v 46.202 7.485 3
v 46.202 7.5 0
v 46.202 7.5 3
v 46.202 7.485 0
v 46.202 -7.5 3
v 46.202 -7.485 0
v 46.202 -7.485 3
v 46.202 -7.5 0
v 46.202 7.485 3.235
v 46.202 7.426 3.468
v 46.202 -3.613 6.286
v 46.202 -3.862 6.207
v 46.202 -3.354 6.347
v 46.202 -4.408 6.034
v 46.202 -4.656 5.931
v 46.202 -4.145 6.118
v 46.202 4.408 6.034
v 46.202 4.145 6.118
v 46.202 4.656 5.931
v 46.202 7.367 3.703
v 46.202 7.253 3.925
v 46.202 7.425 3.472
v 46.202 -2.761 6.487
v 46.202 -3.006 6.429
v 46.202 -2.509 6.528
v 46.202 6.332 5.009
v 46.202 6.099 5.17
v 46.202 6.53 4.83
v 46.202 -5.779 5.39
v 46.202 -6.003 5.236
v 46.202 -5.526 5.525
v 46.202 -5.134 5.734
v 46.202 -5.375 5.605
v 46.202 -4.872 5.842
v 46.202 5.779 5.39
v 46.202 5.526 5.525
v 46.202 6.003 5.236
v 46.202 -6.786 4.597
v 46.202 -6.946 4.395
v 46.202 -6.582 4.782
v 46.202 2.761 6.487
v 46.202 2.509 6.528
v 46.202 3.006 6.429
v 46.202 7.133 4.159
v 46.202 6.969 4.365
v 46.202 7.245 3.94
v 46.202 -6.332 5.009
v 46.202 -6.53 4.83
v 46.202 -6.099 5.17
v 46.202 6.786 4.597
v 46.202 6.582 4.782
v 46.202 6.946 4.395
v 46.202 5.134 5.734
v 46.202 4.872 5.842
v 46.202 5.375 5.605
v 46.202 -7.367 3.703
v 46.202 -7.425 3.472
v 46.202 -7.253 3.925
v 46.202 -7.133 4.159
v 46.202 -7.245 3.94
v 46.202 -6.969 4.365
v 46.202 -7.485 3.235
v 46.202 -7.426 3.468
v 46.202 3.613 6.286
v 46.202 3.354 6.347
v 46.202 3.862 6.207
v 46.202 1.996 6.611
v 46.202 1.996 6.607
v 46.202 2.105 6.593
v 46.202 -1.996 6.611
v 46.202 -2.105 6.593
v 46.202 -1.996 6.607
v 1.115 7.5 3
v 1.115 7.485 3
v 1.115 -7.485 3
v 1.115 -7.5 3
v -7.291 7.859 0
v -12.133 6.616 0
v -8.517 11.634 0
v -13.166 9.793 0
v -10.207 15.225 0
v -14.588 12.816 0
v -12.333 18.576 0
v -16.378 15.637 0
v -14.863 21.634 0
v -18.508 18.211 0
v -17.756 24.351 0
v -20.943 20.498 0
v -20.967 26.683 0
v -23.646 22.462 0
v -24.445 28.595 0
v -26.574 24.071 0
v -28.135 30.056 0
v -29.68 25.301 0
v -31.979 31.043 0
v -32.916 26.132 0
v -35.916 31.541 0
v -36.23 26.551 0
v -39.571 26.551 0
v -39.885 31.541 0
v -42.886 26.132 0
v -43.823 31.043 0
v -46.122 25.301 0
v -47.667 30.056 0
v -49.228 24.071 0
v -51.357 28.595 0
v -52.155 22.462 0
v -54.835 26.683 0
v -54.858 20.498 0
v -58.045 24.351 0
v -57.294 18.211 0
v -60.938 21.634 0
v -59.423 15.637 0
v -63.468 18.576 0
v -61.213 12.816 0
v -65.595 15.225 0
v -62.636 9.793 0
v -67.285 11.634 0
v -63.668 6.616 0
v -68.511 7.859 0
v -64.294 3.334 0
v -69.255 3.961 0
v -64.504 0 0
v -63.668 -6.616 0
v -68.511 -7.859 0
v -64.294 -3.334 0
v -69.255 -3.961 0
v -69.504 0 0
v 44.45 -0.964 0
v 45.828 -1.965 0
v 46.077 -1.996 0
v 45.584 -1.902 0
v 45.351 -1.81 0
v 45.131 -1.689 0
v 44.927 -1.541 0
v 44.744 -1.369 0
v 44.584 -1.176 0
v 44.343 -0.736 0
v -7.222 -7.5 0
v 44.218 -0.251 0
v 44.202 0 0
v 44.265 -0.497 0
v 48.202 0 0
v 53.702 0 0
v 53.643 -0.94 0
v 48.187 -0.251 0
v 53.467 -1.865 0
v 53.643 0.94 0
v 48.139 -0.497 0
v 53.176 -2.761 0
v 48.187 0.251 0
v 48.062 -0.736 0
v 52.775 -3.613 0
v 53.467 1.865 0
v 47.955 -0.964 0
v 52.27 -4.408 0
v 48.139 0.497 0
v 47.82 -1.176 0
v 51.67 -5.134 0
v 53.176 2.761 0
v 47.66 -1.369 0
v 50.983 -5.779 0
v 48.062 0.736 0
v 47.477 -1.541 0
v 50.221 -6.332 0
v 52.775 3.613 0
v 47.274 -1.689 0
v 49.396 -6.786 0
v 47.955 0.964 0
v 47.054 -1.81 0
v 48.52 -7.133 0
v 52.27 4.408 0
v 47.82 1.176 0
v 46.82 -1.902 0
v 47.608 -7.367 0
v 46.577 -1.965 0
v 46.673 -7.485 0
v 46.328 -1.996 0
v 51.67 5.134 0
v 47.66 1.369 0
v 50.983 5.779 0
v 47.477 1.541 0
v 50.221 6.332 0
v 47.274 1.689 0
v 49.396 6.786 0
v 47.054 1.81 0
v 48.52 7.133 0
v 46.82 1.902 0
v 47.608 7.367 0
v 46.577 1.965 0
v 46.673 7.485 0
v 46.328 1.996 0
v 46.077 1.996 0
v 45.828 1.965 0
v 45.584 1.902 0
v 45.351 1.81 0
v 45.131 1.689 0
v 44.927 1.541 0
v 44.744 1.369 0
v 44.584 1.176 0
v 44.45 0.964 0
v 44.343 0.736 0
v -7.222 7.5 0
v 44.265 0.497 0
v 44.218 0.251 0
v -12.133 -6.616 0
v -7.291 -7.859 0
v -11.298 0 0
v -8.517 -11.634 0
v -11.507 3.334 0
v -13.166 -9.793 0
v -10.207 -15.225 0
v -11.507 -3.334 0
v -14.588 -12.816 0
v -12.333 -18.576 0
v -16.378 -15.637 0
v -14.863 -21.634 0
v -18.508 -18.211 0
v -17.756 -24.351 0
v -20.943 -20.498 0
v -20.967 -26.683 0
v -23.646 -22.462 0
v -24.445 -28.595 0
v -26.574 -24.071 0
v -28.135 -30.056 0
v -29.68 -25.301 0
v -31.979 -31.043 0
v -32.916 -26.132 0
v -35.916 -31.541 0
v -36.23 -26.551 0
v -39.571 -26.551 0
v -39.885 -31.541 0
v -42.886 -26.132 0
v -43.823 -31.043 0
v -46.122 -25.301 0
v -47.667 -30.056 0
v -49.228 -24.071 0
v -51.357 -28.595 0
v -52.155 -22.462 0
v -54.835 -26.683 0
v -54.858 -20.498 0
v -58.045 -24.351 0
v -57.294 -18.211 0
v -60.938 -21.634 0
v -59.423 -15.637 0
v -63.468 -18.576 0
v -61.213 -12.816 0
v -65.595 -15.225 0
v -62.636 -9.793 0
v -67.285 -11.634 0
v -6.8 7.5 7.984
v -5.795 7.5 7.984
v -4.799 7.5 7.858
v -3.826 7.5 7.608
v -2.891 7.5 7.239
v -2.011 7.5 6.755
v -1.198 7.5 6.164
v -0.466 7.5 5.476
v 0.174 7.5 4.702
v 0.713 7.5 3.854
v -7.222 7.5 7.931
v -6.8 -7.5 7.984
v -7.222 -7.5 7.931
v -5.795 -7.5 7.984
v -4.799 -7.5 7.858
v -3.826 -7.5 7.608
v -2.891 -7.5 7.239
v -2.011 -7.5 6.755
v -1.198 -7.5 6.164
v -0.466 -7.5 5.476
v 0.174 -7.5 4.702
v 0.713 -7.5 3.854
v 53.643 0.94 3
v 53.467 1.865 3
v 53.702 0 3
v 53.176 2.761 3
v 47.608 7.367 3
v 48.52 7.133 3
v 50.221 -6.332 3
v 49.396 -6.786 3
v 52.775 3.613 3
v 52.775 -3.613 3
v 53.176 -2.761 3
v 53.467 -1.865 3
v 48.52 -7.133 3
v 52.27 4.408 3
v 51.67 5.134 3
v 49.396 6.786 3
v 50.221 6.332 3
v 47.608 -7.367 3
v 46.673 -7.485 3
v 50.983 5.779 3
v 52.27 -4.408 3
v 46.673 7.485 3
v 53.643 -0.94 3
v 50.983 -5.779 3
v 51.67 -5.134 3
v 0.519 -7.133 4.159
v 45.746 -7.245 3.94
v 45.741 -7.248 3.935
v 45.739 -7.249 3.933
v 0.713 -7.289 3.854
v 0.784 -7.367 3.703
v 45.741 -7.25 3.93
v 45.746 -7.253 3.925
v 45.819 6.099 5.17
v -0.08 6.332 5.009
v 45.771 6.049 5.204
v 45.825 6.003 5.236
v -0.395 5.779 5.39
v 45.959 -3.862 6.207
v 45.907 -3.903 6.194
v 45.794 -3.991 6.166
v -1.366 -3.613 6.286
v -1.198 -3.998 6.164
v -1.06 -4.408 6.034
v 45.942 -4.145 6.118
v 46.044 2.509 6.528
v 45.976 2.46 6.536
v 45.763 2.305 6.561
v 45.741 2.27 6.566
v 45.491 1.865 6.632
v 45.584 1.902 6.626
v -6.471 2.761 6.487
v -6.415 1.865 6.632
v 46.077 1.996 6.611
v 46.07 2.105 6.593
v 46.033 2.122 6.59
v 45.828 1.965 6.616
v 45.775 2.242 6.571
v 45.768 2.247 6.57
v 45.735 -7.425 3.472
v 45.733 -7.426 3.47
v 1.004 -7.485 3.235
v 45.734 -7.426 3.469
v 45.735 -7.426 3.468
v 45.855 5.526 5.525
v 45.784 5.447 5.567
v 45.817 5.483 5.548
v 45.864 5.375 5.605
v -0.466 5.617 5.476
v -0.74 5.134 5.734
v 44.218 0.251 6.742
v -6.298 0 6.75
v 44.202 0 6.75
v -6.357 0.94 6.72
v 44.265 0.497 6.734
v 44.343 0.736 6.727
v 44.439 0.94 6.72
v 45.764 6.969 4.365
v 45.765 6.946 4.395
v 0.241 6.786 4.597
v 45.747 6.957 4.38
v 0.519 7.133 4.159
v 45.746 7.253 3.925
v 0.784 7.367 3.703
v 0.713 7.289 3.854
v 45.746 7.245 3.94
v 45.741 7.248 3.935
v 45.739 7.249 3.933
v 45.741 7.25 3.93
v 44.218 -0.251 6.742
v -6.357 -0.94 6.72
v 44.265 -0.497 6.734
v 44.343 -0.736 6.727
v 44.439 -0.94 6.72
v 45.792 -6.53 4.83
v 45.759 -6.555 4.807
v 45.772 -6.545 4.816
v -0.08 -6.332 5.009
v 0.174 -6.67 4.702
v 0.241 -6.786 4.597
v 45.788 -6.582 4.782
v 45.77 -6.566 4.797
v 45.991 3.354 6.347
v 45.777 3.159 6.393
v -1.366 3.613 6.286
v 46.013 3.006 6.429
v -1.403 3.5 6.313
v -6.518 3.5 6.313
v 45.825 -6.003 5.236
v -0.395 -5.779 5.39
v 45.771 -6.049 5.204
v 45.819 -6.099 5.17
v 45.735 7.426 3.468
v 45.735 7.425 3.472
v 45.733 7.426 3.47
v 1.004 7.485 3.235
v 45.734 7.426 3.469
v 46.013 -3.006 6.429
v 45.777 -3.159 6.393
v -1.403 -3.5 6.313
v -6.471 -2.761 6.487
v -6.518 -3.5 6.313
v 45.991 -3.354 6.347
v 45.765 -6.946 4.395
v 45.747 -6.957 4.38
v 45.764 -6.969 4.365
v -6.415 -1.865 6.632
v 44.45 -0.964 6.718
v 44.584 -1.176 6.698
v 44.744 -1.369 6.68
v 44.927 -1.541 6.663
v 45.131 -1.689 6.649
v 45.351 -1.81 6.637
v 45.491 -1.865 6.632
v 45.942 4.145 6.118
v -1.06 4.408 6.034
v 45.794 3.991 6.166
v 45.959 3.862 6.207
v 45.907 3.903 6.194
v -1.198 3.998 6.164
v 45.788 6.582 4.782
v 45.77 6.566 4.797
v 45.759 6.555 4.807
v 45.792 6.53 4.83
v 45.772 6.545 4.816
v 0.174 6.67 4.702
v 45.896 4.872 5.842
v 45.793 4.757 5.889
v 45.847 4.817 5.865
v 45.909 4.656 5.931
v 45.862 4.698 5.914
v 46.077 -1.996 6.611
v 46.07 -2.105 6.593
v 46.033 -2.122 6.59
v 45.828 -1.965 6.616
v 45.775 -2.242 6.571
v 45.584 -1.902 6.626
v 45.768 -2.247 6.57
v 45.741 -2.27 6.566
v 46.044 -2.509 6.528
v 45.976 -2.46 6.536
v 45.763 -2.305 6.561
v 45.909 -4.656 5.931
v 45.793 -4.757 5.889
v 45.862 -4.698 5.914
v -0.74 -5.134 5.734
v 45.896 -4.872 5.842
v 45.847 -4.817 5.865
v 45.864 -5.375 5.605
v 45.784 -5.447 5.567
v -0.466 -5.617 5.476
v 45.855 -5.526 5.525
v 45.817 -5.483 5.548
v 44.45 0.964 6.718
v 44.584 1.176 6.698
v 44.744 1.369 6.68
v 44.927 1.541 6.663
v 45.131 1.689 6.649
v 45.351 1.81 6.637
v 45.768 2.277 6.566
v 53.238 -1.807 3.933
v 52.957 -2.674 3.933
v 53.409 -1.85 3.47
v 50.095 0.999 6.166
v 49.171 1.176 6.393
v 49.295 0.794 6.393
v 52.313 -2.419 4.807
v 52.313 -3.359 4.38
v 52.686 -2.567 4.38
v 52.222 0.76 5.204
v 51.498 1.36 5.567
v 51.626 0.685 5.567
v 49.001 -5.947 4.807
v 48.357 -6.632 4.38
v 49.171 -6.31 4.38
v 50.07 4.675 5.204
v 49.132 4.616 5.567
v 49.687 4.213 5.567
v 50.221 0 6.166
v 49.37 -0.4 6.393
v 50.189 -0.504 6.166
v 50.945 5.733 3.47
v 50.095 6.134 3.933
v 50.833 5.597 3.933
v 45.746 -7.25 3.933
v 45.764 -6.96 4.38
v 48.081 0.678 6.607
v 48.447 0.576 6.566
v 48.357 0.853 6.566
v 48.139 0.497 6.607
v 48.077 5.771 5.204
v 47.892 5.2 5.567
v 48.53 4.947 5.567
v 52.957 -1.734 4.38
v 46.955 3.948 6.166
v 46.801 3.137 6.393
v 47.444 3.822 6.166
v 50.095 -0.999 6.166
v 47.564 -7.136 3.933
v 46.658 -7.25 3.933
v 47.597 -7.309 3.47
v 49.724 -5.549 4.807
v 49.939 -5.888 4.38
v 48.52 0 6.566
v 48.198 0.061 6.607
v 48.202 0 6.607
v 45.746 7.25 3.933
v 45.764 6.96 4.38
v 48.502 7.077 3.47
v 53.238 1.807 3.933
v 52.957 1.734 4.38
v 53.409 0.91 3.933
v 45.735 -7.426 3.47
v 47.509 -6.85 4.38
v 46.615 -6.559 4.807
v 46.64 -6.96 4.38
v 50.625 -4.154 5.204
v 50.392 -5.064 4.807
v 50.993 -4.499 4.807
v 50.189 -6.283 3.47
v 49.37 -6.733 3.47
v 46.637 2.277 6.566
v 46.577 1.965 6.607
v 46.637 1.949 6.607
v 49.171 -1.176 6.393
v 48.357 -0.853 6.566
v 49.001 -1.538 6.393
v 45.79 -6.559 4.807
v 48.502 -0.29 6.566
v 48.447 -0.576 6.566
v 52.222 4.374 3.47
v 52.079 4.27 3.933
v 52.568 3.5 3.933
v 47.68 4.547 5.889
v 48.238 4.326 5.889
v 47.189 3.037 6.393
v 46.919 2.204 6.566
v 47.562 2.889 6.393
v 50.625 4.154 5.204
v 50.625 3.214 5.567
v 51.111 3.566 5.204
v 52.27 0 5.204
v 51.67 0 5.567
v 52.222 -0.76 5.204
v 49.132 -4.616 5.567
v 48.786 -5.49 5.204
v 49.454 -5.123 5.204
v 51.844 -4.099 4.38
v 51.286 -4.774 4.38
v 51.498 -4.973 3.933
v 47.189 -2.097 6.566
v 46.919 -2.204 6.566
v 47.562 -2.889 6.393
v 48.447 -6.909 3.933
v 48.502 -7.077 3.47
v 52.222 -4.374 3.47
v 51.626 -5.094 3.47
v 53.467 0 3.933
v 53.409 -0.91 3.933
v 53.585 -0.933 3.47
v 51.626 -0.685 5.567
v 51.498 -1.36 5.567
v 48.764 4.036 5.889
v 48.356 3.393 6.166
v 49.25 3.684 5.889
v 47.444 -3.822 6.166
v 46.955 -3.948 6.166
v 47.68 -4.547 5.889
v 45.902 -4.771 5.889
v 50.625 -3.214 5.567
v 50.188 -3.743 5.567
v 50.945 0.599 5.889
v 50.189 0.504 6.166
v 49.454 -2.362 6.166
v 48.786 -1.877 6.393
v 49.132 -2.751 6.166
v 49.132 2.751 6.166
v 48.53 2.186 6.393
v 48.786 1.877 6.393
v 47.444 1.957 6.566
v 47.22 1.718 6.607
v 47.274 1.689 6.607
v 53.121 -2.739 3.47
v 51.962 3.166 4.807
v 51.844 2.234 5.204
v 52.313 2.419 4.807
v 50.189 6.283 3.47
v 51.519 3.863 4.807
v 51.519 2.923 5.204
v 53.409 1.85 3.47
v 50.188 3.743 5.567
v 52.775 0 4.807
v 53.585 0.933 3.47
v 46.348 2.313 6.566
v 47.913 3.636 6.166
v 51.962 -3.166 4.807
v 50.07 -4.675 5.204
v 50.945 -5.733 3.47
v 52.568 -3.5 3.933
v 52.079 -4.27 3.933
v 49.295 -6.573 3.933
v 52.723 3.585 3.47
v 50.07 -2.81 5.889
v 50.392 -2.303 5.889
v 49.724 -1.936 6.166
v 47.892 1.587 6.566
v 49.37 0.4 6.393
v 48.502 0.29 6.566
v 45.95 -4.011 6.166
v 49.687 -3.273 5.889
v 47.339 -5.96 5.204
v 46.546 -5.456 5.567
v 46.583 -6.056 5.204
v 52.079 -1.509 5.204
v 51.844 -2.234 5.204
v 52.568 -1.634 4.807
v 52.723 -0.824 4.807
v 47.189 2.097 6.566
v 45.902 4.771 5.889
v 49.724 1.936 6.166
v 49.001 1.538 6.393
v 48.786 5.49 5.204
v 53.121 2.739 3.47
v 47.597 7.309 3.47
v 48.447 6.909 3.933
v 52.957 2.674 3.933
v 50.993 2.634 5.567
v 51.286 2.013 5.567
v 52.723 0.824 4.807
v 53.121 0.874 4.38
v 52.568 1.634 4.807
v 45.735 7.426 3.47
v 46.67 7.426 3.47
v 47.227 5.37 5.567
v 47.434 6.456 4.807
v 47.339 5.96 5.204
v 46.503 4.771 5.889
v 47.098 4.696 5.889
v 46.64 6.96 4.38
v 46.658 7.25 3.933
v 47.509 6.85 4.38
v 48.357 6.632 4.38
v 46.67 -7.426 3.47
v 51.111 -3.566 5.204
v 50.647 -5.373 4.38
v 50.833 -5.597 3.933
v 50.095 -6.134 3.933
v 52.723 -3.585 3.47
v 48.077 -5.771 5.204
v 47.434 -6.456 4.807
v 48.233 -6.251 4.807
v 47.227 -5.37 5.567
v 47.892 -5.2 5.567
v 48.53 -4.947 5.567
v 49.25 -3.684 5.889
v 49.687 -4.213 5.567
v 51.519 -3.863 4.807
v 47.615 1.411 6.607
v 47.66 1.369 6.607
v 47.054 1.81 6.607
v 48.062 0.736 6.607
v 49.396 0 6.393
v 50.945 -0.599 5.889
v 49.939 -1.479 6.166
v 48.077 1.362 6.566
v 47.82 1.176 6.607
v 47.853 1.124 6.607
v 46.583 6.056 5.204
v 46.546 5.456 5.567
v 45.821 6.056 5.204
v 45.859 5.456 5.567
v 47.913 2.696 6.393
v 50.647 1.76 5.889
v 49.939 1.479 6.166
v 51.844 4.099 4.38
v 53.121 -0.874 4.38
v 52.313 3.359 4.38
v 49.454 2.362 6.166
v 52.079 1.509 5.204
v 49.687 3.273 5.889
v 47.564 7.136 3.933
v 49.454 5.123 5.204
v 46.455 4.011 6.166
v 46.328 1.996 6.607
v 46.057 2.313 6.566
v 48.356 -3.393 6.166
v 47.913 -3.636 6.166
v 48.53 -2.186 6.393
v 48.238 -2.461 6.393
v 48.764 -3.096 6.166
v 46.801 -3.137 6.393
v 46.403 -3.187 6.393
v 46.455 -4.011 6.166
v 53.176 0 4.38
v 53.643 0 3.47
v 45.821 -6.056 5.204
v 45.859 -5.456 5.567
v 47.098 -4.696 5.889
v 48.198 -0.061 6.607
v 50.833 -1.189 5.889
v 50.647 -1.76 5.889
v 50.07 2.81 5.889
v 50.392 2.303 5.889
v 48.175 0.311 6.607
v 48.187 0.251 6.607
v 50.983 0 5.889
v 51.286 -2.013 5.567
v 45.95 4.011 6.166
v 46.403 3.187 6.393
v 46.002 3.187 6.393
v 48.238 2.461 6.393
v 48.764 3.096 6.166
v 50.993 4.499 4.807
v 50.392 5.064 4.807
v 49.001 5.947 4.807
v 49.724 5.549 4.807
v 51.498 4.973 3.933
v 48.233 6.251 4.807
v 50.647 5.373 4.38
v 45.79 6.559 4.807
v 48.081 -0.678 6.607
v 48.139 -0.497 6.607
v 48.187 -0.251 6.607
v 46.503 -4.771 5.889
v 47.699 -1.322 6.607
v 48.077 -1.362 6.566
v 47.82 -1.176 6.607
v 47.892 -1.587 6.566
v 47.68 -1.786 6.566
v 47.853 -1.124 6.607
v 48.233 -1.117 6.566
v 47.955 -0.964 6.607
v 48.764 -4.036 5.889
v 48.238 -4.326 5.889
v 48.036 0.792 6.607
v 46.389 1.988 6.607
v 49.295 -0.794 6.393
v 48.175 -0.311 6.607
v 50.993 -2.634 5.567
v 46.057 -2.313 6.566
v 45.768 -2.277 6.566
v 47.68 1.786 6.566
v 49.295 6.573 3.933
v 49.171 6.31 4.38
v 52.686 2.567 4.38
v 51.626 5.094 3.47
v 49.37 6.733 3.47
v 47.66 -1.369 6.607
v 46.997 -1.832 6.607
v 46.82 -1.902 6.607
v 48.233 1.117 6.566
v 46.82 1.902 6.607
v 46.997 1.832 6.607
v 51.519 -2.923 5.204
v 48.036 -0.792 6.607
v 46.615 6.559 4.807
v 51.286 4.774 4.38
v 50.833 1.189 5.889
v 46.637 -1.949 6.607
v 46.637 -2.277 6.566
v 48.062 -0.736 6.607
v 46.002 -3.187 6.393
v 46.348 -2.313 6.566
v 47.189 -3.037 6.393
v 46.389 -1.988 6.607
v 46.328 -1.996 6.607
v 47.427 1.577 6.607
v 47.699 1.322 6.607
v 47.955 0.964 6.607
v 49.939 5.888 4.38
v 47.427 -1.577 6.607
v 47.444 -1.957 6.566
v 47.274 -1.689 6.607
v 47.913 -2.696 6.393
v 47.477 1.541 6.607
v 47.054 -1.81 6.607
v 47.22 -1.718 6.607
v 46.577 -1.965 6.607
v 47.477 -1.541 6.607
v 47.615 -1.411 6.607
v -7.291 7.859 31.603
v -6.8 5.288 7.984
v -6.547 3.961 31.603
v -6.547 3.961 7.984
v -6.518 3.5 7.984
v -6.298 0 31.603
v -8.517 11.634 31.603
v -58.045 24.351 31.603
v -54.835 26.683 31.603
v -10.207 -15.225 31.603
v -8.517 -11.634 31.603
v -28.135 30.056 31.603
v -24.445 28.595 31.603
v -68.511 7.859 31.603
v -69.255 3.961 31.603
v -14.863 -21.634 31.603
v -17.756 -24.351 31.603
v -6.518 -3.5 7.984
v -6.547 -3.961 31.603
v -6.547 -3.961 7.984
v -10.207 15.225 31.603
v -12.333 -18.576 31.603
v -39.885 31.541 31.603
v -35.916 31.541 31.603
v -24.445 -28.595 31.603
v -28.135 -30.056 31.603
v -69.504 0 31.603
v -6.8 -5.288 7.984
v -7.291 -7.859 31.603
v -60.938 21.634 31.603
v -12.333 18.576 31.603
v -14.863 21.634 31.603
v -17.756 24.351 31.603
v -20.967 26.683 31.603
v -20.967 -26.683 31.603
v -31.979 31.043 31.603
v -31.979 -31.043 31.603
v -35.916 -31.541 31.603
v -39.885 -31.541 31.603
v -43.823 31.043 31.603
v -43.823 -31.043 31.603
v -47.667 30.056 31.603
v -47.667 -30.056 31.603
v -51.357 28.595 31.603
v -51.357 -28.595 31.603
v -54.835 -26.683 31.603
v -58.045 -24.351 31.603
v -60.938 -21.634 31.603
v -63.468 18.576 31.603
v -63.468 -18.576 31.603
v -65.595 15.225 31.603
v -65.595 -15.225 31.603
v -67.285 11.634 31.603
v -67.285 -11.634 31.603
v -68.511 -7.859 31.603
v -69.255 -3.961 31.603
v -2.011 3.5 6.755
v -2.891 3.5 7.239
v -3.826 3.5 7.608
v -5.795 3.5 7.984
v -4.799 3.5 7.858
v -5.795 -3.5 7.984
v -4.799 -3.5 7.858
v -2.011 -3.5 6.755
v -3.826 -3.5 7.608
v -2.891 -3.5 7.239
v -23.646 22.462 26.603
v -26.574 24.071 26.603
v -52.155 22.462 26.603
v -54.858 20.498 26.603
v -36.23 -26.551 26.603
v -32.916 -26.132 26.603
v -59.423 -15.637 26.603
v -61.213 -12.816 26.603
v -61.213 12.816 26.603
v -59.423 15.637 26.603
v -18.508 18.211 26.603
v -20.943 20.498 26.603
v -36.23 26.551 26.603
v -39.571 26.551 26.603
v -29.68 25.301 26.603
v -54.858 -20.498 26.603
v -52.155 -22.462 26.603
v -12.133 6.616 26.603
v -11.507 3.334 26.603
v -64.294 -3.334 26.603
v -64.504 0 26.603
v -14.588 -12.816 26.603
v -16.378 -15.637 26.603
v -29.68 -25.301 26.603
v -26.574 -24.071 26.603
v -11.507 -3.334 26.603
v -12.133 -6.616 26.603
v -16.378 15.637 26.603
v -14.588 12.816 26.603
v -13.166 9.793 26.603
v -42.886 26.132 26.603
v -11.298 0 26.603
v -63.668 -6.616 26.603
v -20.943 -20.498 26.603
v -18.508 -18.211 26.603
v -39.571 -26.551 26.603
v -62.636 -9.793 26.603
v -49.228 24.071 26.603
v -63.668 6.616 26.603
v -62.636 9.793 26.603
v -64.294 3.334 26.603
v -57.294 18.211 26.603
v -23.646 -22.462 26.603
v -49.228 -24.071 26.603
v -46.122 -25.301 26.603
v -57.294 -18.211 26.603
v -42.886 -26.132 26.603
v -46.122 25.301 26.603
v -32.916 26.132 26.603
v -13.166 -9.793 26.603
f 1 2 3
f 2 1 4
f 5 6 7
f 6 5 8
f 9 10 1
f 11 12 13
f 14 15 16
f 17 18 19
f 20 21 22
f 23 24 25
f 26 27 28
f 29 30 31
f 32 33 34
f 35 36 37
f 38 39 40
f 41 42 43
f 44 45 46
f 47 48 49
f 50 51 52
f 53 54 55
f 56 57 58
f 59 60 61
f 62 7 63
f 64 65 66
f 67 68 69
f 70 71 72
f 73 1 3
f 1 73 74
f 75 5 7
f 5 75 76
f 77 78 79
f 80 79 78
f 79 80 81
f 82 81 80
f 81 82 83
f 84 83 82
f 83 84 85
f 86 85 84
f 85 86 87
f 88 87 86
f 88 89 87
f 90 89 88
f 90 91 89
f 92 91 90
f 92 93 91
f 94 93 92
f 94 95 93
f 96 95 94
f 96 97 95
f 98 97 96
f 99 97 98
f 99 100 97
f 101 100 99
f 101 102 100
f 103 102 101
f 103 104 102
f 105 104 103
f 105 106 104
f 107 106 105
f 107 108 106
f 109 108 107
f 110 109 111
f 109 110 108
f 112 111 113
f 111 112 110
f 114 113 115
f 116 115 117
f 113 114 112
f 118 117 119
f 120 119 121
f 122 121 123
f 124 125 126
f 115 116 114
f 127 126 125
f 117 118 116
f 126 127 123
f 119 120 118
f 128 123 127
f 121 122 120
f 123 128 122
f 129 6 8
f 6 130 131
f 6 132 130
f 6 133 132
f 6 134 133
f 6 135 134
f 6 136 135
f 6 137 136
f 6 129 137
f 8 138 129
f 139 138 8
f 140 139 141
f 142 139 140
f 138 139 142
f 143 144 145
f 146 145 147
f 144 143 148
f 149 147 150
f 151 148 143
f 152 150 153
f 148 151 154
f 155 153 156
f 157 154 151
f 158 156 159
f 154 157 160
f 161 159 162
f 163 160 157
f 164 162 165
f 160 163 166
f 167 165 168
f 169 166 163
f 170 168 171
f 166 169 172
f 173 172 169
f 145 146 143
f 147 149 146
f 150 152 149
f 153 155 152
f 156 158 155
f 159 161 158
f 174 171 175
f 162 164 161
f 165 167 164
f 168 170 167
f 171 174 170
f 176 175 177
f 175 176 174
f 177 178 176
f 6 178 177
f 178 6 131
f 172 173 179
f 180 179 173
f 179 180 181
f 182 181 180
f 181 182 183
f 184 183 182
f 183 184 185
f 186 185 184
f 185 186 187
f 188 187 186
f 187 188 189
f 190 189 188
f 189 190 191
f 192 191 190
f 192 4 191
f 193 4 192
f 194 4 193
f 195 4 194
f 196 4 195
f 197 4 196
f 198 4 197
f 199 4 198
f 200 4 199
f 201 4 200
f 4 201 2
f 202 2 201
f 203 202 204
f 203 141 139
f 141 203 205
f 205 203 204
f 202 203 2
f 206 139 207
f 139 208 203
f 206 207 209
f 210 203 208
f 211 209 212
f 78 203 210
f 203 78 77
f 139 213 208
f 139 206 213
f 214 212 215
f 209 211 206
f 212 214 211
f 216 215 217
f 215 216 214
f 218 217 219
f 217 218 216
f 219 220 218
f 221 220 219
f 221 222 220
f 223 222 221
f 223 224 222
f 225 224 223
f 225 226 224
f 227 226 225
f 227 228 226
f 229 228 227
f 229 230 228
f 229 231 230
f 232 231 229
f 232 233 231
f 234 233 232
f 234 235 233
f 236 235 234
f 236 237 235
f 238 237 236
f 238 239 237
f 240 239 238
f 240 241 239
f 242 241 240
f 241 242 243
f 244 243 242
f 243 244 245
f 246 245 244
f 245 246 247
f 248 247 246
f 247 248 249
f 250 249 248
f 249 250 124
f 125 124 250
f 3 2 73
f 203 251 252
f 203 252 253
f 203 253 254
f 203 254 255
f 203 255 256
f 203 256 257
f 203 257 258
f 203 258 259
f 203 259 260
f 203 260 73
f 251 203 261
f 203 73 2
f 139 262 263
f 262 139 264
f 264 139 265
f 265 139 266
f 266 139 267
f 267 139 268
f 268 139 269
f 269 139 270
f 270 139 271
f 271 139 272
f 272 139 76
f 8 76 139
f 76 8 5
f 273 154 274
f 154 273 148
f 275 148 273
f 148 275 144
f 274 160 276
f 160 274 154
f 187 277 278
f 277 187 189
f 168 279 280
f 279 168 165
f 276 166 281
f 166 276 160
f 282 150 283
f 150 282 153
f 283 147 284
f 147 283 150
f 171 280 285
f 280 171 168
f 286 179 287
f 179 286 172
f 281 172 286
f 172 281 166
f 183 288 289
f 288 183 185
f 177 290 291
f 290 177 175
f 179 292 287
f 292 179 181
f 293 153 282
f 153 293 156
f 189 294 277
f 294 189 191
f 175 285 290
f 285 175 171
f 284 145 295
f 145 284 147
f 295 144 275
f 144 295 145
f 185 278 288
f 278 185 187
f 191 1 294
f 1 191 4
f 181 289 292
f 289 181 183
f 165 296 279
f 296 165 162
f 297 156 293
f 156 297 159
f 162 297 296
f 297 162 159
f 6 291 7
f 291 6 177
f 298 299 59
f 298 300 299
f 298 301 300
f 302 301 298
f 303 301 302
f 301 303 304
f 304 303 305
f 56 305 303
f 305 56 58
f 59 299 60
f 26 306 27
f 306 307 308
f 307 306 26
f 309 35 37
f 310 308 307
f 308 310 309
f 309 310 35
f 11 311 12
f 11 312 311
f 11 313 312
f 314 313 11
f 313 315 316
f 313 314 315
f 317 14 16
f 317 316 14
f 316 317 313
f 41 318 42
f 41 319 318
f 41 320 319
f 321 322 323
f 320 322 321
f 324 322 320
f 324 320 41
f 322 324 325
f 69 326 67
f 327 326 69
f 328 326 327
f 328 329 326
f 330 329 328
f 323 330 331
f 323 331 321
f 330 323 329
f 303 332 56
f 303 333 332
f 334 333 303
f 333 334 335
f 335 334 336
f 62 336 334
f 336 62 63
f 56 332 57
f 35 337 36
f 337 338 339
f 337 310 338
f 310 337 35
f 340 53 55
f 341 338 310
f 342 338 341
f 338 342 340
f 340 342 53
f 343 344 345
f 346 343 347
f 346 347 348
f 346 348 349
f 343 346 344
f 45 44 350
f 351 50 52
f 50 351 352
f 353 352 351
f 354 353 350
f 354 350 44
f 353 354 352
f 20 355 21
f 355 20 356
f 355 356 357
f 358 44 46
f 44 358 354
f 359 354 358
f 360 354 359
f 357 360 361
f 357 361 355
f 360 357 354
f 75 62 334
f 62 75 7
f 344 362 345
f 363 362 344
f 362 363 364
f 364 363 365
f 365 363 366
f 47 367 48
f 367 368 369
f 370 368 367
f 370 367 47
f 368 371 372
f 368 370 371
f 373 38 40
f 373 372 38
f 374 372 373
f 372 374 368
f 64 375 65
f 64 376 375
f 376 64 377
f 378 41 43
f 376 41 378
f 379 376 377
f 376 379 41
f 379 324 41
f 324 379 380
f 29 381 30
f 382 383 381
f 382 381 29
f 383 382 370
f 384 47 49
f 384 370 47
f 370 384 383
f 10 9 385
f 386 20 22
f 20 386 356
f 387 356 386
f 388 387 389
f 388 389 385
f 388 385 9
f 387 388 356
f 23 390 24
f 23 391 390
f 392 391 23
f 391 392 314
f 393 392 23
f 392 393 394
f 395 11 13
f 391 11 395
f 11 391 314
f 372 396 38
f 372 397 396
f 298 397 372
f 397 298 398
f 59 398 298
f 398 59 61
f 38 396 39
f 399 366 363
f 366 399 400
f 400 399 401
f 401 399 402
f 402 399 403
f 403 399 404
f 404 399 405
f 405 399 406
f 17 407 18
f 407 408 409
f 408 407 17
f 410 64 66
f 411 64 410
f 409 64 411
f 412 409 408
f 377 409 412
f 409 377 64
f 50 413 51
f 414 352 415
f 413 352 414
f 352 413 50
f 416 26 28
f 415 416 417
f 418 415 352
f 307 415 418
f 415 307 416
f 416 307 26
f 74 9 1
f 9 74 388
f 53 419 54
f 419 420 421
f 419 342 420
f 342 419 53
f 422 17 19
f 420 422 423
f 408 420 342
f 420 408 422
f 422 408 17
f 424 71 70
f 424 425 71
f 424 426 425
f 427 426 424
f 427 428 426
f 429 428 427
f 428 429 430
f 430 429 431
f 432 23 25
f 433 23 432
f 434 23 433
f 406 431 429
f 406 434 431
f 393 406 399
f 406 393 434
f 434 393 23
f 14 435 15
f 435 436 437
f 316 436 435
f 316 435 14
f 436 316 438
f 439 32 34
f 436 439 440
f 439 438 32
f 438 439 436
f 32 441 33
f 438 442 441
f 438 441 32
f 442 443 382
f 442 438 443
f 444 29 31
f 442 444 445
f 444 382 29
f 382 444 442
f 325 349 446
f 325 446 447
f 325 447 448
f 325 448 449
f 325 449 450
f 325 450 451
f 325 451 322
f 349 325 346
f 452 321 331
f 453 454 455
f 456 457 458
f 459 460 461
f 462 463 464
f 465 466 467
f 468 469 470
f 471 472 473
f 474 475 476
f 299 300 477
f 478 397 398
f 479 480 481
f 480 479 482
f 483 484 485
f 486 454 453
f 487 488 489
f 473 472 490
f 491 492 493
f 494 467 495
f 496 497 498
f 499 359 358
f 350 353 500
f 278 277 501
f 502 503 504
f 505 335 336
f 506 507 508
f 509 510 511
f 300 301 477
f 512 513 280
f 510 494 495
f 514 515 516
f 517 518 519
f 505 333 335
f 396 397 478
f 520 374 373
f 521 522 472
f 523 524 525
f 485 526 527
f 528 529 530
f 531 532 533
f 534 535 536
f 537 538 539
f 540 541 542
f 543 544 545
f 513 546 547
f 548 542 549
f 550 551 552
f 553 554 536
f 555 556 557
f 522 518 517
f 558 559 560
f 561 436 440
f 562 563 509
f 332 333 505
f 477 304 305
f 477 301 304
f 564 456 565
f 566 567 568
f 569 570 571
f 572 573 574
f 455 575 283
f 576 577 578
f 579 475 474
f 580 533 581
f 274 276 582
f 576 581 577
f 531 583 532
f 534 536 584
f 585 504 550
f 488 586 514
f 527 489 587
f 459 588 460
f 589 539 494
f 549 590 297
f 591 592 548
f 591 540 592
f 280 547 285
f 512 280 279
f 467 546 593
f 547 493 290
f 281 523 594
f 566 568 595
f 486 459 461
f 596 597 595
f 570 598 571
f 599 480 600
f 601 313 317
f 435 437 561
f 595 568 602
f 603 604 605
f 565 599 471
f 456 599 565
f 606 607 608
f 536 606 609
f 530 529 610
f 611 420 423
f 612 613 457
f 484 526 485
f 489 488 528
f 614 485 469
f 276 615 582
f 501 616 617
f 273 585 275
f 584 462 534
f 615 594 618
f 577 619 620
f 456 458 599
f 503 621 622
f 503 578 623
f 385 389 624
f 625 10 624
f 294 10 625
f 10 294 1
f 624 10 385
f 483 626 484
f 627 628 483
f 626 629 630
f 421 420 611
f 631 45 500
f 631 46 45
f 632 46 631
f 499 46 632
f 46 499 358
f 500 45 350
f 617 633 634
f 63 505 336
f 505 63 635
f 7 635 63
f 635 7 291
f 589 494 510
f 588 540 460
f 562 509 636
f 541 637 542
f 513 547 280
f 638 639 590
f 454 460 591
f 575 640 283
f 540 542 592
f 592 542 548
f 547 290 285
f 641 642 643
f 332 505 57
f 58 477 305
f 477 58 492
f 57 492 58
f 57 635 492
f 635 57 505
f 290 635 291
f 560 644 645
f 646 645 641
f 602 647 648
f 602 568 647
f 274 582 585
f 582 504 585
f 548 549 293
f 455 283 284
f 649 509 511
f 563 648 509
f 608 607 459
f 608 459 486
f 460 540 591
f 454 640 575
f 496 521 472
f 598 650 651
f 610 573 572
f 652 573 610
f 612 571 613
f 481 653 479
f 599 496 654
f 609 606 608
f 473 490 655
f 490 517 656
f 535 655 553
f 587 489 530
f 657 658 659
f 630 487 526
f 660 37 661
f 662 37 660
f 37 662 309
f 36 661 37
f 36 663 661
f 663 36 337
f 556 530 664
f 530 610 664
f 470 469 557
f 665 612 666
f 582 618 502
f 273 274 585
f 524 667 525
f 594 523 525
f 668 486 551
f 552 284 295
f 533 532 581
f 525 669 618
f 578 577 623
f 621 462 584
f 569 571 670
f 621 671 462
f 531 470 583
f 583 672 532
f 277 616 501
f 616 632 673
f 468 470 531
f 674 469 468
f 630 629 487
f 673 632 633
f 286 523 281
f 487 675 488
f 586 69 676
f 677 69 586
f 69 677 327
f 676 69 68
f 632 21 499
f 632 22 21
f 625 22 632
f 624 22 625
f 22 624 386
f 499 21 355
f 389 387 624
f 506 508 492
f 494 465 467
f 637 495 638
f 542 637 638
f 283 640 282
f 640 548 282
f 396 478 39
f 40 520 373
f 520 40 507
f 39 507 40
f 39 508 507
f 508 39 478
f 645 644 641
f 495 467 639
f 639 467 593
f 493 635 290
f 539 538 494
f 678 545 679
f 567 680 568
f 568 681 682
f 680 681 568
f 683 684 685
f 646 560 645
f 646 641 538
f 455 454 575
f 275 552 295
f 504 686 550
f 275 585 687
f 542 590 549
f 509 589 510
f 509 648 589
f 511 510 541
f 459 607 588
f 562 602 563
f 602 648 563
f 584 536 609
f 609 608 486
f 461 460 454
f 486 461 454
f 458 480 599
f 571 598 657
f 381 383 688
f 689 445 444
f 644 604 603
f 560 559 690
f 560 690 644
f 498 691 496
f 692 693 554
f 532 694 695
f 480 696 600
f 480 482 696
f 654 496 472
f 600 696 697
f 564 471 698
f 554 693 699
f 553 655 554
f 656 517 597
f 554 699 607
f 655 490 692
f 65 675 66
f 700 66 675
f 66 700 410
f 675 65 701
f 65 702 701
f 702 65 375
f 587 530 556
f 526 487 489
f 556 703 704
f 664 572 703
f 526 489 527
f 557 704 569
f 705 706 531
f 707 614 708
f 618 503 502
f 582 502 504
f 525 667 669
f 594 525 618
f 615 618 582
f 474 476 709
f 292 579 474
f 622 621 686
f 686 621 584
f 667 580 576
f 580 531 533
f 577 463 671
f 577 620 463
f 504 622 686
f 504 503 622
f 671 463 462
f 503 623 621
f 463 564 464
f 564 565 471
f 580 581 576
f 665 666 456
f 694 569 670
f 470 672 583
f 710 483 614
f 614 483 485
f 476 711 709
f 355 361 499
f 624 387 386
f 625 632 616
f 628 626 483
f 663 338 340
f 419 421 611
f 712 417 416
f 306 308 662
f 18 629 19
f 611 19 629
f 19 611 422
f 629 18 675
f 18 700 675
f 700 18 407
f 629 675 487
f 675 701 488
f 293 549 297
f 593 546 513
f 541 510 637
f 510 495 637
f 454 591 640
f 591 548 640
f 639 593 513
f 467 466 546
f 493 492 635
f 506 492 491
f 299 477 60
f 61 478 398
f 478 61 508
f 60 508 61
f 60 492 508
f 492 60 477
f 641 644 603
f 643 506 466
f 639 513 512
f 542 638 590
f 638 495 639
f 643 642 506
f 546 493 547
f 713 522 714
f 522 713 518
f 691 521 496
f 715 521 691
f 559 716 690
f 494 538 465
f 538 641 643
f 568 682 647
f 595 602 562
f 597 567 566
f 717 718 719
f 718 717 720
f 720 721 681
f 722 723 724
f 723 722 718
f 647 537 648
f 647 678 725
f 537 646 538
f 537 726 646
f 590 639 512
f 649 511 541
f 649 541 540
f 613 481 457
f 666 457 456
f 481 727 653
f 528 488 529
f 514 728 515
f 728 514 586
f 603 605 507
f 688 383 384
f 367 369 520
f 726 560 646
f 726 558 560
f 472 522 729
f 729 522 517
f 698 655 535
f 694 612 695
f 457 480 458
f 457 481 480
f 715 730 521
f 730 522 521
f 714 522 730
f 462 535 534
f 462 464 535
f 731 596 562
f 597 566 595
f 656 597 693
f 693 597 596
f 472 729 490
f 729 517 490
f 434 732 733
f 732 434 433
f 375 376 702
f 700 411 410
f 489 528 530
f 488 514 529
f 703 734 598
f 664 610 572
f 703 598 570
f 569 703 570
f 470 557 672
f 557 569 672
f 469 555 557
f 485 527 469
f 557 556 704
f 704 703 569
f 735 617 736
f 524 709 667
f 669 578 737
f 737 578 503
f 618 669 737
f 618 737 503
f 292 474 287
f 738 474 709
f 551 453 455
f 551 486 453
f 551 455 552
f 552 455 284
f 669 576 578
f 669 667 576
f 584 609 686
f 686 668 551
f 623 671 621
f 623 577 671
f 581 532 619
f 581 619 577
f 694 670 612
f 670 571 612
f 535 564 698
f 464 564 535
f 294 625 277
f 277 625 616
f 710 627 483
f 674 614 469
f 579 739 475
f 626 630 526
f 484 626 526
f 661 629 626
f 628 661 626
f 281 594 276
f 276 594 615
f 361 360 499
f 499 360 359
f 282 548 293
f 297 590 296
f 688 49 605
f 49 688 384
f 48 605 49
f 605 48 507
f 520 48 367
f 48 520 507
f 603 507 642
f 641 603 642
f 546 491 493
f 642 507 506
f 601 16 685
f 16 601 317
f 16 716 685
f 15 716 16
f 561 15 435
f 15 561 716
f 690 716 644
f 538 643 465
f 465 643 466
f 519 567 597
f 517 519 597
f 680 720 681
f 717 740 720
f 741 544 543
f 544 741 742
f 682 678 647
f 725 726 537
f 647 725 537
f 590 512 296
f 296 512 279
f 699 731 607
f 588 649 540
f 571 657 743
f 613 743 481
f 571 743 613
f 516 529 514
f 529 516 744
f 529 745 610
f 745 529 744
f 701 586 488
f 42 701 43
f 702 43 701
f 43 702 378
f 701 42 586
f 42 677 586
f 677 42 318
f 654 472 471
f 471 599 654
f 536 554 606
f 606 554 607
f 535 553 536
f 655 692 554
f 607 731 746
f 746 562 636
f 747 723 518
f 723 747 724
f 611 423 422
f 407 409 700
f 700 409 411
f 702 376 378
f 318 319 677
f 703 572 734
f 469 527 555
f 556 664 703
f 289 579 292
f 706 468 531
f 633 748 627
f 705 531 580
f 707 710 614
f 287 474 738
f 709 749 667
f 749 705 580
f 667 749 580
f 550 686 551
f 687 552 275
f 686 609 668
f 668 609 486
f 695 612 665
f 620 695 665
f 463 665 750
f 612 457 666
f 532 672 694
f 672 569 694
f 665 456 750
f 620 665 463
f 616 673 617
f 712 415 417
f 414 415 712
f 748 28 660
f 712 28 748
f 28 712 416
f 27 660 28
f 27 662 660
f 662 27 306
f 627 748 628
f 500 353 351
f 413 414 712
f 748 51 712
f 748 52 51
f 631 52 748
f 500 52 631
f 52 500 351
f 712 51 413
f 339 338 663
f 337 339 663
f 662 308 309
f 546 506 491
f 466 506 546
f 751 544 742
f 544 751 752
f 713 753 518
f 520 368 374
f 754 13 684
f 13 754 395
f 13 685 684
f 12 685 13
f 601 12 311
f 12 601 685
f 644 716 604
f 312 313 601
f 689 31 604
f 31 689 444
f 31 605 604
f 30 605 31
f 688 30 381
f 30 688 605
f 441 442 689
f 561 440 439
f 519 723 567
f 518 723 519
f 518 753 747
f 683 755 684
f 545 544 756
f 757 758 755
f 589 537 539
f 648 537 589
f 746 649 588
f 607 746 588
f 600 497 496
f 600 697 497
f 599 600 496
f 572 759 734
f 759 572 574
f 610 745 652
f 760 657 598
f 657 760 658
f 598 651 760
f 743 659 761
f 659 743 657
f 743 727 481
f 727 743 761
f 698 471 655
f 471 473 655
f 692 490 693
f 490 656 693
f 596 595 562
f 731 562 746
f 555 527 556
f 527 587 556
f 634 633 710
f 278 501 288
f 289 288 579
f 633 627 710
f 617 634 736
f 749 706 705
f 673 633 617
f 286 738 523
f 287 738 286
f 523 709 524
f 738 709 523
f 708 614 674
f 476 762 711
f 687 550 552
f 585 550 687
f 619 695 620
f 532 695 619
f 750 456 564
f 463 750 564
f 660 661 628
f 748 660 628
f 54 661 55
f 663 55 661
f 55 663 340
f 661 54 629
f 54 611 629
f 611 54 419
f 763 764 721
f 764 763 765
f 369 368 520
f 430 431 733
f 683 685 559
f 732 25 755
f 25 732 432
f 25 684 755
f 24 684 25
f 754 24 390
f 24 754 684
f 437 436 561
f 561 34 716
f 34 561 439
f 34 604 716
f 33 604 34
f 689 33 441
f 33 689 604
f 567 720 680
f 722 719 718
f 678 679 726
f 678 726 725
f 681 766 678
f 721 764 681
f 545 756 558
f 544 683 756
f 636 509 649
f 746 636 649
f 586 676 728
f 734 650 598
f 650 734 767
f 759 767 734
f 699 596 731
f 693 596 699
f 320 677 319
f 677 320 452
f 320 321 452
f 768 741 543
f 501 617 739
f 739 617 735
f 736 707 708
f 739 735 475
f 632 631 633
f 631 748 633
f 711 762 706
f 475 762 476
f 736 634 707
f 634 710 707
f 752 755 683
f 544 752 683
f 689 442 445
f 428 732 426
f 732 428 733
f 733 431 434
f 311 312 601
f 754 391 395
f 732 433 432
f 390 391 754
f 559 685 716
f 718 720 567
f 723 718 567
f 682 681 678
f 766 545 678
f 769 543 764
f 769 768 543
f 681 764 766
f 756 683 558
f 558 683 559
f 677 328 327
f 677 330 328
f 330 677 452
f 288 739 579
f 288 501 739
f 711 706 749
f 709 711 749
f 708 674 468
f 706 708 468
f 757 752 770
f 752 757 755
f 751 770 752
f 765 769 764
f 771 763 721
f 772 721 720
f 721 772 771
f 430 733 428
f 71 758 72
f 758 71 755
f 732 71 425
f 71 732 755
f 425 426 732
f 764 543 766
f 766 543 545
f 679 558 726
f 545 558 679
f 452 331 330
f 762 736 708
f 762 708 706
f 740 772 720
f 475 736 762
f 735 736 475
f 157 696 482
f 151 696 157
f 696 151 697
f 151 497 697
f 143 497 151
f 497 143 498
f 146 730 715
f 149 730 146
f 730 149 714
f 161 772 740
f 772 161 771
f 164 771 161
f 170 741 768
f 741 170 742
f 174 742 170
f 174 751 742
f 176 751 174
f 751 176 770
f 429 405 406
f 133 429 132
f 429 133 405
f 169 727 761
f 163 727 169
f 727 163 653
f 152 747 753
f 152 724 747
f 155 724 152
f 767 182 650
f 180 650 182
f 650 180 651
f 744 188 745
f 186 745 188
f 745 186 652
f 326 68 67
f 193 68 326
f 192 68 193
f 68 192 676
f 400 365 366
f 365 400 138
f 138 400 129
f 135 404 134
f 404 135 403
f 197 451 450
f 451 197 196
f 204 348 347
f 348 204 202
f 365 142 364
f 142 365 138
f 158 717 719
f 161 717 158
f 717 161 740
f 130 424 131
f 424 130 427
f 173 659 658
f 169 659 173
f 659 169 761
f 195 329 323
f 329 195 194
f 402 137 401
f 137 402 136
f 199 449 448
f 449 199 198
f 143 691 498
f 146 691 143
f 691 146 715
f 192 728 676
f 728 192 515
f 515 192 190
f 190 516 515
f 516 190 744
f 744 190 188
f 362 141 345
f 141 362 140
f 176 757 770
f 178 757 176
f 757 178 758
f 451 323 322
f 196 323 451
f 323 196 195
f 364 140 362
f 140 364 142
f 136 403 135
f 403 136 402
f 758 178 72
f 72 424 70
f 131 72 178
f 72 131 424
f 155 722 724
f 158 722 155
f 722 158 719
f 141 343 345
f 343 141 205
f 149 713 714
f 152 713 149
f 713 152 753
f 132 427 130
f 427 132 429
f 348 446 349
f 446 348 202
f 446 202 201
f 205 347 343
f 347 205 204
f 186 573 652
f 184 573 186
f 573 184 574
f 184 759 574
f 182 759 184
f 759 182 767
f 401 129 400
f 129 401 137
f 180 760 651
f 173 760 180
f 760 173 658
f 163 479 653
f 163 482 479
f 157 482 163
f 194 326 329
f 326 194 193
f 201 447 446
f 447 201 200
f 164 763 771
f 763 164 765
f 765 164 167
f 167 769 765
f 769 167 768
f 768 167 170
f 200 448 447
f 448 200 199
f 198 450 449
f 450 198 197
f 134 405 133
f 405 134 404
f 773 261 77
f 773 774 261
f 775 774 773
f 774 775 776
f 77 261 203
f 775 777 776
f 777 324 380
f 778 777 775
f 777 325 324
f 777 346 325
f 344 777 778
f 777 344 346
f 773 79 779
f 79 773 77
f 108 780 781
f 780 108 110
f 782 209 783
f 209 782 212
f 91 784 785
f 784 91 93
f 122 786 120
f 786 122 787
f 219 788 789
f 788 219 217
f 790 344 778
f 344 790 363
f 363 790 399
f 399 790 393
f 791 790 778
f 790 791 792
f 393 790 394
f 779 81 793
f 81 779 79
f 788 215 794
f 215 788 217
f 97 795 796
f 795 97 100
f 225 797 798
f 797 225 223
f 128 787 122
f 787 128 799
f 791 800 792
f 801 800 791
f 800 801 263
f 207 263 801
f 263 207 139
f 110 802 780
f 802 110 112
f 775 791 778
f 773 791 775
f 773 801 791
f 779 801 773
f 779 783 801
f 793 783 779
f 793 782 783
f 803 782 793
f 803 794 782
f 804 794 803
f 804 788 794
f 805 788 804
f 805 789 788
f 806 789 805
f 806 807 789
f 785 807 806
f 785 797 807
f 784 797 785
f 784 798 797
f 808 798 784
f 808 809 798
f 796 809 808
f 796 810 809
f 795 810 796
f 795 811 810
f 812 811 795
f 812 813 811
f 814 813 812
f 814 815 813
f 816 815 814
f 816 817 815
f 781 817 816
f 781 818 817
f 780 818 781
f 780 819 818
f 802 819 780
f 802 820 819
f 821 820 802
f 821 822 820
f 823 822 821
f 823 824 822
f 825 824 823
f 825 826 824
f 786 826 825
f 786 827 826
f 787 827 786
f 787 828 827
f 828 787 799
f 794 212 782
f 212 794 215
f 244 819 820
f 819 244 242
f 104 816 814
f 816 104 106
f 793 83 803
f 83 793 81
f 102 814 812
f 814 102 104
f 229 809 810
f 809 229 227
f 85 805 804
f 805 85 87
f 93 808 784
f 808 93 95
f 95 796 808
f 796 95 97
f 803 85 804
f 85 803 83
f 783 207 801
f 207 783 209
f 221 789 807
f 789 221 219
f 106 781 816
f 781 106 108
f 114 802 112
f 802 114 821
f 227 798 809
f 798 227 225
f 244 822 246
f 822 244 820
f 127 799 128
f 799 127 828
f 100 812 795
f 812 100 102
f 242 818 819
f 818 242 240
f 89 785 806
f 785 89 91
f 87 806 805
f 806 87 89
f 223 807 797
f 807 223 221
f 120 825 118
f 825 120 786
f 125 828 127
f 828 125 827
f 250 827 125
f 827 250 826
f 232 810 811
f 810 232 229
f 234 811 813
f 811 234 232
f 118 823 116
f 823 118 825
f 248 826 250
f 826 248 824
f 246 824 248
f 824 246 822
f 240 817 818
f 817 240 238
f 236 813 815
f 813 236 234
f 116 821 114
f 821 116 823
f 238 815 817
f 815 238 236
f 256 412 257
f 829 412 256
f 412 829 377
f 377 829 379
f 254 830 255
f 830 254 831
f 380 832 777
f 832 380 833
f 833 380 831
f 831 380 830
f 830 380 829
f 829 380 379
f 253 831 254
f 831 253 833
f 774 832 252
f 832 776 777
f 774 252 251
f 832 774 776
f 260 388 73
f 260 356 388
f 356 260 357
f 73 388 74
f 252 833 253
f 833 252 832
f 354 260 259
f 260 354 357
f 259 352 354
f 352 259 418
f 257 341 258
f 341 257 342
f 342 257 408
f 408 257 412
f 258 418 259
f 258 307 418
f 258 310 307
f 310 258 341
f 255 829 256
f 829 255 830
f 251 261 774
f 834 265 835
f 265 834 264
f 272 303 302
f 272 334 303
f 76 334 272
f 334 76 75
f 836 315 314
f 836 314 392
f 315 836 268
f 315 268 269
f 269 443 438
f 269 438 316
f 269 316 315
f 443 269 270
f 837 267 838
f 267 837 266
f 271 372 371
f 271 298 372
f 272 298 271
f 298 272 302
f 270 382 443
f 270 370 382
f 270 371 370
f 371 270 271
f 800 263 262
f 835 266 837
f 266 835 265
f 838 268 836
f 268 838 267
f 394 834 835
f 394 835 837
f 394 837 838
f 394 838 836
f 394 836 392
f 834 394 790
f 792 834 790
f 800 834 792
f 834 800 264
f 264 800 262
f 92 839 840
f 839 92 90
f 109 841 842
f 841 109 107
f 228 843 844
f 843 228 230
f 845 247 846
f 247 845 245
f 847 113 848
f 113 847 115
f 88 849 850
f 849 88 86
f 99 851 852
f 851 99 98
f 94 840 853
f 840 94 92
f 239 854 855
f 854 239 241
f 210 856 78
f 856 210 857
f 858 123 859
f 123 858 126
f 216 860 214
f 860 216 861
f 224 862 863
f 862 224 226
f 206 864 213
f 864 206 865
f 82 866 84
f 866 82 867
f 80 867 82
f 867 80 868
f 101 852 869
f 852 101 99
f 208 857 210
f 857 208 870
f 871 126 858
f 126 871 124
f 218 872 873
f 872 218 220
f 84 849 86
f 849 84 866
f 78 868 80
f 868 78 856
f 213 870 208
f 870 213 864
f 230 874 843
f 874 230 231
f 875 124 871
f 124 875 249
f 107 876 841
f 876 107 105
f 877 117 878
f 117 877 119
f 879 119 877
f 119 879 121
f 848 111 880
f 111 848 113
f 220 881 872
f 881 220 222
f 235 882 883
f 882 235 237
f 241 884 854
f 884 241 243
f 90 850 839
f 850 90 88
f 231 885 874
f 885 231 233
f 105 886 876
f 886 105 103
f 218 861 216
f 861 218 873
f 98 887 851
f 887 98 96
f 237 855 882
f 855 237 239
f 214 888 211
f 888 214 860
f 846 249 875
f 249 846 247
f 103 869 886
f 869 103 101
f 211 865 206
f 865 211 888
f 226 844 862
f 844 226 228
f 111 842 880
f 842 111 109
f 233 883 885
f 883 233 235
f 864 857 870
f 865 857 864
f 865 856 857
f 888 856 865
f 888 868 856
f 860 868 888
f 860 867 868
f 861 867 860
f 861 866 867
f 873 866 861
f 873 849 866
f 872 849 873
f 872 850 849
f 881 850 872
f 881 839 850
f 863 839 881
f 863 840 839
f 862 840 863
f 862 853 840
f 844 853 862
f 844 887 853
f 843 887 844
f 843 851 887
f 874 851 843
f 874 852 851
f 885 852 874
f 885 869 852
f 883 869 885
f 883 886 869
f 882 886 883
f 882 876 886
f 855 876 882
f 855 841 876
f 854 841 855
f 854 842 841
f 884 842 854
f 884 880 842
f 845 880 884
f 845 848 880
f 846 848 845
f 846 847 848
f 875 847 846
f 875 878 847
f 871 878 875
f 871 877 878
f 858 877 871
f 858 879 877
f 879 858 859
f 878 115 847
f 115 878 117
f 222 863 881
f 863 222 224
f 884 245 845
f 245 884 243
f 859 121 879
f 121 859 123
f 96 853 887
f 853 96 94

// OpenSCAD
// Customized Measuring Cup
// v 1.0
//
// (C) Copyright 2013, Brian Enigma, some rights reserved.
//
// Customized Measuring Cup by Brian Enigma is licensed under a Creative Commons 
// Attribution-ShareAlike 3.0 Unported License.
//
// - http://netninja.com
// - http://www.thingiverse.com/BrianEnigma

/*
Calculation Notes:

Cups       Cups (Reduced)      ml
~~~~       ~~~~~~~~~~~~~~      ~~
1/8        1/8     0.125       29.57
2/8        1/4     0.25        59.15
3/8        3/8     0.375       88.72
4/8        1/2     0.5         118.30
5/8        5/8     0.625       147.87
6/8        3/4     0.75        177.44
7/8        7/8     0.875       207.02
8/8        1       1           236.59

Volume of cylinder = pi * r^2 * h

If we make radius and height the same: 

v = pi * h^2 * h = pi * h^3

solve for h

h = cube_root(v) / cube_root(pi) * 10 = 6.8278 * cube_root(v)

h = 6.8278 * pow(v, 1/3)
*/

// Pick a predefined volume or select "Custom" to pick your own
volume = 59.15; // [29.57:1/8 Cup, 59.15:1/4 Cup, 88.72:3/8 Cup, 118.30:1/2 Cup, 147.87:5/8 Cup, 177.44:3/4 Cup, 207.02:7/8 Cup, 236.59:1 Cup, 0:Custom]
// If using a custom volume, pick a value
custom_volume_in_milliliters = 15; // [15:500]

// The thickness of the scoop wall
wall_thickness = 5; // [1:8]

// width of handle
handle_width = 15; // [10:20]

// length of handle (actually, not including the end-cap)
handle_length = 60; // [15:80]

// The diameter (in mm) of the hole in the handle
hanger_hole_hole_diameter = 4; // [0:5]

handle_thickness = 3 * 1;

// resolution of cylinders -- 10 makes for quick renders, higher makes for good prints
//DETAIL = 30 * 1;
DETAIL = 50 * 1;
//DETAIL = 100 * 1;

module handle(outer_wall_radius, handle_thickness, handle_width, handle_length, hanger_hole_hole_diameter) 
{
    difference()
    {
        union()
        {
            // flat handle part
            translate(v = [0, handle_width / -2, 0])
            	cube(size = [handle_length + outer_wall_radius - handle_width / 2, handle_width, handle_thickness]);
            // flat cap at end of handle
            translate(v = [handle_length + outer_wall_radius - handle_width / 2, 0, 0]) 
            	cylinder(h = handle_thickness, r = handle_width / 2, $fn = DETAIL);
			// curved handle part
            translate(v = [0, 0, handle_thickness])
				scale(v = [1, 1, 0.5])
					rotate(a = [0, 90, 0])
            			cylinder(h = handle_length + outer_wall_radius - handle_width / 2, r = handle_width / 2, $fn = DETAIL);
			// curved cap at end of handle
            translate(v = [handle_length + outer_wall_radius - handle_width / 2, 0, handle_thickness])
				scale(v = [1, 1, 0.5])
           			sphere(r = handle_width / 2, $fn = DETAIL);
			
        }
    	// subtract out hanger hole
    	translate(v = [handle_length + outer_wall_radius - handle_width / 2, 0, -1]) 
    		cylinder(h = handle_thickness * 10, r = hanger_hole_hole_diameter / 2, $fn = DETAIL);
	}
}

module build_measuring_cup(volume, height, radius, handle_thickness, handle_width, handle_length, handle_hole_diameter)
{
	echo(str("Building measuring cup with volume ", volume, "ml, height ", height, "mm, radius ", radius, "mm."));
	translate(v = [((radius + wall_thickness) / 2 + handle_length) / -2, 0, 0]) // slide over to be better centered on the table
		difference()
		{
			union()
			{
				// Outer cylinder
			    cylinder(h = height + wall_thickness, r = radius + wall_thickness, $fn = DETAIL);
				// Handle braces
				translate(v = [radius + wall_thickness, handle_width / 2, 0])
					rotate(a = [90, 0, 0])
						cylinder(h = 4, r = 8, $fn = DETAIL);
				translate(v = [radius + wall_thickness, handle_width / -2 + 4, 0])
					rotate(a = [90, 0, 0])
						cylinder(h = 4, r = 8, $fn = DETAIL);
				// Handle
				handle(radius + wall_thickness, handle_thickness, handle_width, handle_length, handle_hole_diameter);
			}
			// Subtract out inner cylinder
			translate(v = [0, 0, -1])
		    	cylinder(h = height + 1, r = radius, $fn = DETAIL);
			// Subtract out anything below the floor (e.g. leftover bits of the handle brace)
			translate(v = [radius * -2, (radius * 4) / -2, -50])
				cube(size = [radius * 2 + handle_length * 3 + 100, radius * 4, 50]);
		}
}

if (0 == volume)
{
	echo("Building custom measuring cup");
	build_measuring_cup(
		custom_volume_in_milliliters, 
		6.8278 * pow(custom_volume_in_milliliters, 1/3), 
		6.8278 * pow(custom_volume_in_milliliters, 1/3), 
		handle_thickness, 
		handle_width,
		handle_length, 
		hanger_hole_hole_diameter);
} else {
	echo("Building predefined measuring cup");
	echo(str("Test: ", pow(volume, 1/3)));
	build_measuring_cup(
		volume, 
		6.8278 * pow(volume, 1/3), 
		6.8278 * pow(volume, 1/3), 
		handle_thickness, 
		handle_width,
		handle_length, 
		hanger_hole_hole_diameter);
}
